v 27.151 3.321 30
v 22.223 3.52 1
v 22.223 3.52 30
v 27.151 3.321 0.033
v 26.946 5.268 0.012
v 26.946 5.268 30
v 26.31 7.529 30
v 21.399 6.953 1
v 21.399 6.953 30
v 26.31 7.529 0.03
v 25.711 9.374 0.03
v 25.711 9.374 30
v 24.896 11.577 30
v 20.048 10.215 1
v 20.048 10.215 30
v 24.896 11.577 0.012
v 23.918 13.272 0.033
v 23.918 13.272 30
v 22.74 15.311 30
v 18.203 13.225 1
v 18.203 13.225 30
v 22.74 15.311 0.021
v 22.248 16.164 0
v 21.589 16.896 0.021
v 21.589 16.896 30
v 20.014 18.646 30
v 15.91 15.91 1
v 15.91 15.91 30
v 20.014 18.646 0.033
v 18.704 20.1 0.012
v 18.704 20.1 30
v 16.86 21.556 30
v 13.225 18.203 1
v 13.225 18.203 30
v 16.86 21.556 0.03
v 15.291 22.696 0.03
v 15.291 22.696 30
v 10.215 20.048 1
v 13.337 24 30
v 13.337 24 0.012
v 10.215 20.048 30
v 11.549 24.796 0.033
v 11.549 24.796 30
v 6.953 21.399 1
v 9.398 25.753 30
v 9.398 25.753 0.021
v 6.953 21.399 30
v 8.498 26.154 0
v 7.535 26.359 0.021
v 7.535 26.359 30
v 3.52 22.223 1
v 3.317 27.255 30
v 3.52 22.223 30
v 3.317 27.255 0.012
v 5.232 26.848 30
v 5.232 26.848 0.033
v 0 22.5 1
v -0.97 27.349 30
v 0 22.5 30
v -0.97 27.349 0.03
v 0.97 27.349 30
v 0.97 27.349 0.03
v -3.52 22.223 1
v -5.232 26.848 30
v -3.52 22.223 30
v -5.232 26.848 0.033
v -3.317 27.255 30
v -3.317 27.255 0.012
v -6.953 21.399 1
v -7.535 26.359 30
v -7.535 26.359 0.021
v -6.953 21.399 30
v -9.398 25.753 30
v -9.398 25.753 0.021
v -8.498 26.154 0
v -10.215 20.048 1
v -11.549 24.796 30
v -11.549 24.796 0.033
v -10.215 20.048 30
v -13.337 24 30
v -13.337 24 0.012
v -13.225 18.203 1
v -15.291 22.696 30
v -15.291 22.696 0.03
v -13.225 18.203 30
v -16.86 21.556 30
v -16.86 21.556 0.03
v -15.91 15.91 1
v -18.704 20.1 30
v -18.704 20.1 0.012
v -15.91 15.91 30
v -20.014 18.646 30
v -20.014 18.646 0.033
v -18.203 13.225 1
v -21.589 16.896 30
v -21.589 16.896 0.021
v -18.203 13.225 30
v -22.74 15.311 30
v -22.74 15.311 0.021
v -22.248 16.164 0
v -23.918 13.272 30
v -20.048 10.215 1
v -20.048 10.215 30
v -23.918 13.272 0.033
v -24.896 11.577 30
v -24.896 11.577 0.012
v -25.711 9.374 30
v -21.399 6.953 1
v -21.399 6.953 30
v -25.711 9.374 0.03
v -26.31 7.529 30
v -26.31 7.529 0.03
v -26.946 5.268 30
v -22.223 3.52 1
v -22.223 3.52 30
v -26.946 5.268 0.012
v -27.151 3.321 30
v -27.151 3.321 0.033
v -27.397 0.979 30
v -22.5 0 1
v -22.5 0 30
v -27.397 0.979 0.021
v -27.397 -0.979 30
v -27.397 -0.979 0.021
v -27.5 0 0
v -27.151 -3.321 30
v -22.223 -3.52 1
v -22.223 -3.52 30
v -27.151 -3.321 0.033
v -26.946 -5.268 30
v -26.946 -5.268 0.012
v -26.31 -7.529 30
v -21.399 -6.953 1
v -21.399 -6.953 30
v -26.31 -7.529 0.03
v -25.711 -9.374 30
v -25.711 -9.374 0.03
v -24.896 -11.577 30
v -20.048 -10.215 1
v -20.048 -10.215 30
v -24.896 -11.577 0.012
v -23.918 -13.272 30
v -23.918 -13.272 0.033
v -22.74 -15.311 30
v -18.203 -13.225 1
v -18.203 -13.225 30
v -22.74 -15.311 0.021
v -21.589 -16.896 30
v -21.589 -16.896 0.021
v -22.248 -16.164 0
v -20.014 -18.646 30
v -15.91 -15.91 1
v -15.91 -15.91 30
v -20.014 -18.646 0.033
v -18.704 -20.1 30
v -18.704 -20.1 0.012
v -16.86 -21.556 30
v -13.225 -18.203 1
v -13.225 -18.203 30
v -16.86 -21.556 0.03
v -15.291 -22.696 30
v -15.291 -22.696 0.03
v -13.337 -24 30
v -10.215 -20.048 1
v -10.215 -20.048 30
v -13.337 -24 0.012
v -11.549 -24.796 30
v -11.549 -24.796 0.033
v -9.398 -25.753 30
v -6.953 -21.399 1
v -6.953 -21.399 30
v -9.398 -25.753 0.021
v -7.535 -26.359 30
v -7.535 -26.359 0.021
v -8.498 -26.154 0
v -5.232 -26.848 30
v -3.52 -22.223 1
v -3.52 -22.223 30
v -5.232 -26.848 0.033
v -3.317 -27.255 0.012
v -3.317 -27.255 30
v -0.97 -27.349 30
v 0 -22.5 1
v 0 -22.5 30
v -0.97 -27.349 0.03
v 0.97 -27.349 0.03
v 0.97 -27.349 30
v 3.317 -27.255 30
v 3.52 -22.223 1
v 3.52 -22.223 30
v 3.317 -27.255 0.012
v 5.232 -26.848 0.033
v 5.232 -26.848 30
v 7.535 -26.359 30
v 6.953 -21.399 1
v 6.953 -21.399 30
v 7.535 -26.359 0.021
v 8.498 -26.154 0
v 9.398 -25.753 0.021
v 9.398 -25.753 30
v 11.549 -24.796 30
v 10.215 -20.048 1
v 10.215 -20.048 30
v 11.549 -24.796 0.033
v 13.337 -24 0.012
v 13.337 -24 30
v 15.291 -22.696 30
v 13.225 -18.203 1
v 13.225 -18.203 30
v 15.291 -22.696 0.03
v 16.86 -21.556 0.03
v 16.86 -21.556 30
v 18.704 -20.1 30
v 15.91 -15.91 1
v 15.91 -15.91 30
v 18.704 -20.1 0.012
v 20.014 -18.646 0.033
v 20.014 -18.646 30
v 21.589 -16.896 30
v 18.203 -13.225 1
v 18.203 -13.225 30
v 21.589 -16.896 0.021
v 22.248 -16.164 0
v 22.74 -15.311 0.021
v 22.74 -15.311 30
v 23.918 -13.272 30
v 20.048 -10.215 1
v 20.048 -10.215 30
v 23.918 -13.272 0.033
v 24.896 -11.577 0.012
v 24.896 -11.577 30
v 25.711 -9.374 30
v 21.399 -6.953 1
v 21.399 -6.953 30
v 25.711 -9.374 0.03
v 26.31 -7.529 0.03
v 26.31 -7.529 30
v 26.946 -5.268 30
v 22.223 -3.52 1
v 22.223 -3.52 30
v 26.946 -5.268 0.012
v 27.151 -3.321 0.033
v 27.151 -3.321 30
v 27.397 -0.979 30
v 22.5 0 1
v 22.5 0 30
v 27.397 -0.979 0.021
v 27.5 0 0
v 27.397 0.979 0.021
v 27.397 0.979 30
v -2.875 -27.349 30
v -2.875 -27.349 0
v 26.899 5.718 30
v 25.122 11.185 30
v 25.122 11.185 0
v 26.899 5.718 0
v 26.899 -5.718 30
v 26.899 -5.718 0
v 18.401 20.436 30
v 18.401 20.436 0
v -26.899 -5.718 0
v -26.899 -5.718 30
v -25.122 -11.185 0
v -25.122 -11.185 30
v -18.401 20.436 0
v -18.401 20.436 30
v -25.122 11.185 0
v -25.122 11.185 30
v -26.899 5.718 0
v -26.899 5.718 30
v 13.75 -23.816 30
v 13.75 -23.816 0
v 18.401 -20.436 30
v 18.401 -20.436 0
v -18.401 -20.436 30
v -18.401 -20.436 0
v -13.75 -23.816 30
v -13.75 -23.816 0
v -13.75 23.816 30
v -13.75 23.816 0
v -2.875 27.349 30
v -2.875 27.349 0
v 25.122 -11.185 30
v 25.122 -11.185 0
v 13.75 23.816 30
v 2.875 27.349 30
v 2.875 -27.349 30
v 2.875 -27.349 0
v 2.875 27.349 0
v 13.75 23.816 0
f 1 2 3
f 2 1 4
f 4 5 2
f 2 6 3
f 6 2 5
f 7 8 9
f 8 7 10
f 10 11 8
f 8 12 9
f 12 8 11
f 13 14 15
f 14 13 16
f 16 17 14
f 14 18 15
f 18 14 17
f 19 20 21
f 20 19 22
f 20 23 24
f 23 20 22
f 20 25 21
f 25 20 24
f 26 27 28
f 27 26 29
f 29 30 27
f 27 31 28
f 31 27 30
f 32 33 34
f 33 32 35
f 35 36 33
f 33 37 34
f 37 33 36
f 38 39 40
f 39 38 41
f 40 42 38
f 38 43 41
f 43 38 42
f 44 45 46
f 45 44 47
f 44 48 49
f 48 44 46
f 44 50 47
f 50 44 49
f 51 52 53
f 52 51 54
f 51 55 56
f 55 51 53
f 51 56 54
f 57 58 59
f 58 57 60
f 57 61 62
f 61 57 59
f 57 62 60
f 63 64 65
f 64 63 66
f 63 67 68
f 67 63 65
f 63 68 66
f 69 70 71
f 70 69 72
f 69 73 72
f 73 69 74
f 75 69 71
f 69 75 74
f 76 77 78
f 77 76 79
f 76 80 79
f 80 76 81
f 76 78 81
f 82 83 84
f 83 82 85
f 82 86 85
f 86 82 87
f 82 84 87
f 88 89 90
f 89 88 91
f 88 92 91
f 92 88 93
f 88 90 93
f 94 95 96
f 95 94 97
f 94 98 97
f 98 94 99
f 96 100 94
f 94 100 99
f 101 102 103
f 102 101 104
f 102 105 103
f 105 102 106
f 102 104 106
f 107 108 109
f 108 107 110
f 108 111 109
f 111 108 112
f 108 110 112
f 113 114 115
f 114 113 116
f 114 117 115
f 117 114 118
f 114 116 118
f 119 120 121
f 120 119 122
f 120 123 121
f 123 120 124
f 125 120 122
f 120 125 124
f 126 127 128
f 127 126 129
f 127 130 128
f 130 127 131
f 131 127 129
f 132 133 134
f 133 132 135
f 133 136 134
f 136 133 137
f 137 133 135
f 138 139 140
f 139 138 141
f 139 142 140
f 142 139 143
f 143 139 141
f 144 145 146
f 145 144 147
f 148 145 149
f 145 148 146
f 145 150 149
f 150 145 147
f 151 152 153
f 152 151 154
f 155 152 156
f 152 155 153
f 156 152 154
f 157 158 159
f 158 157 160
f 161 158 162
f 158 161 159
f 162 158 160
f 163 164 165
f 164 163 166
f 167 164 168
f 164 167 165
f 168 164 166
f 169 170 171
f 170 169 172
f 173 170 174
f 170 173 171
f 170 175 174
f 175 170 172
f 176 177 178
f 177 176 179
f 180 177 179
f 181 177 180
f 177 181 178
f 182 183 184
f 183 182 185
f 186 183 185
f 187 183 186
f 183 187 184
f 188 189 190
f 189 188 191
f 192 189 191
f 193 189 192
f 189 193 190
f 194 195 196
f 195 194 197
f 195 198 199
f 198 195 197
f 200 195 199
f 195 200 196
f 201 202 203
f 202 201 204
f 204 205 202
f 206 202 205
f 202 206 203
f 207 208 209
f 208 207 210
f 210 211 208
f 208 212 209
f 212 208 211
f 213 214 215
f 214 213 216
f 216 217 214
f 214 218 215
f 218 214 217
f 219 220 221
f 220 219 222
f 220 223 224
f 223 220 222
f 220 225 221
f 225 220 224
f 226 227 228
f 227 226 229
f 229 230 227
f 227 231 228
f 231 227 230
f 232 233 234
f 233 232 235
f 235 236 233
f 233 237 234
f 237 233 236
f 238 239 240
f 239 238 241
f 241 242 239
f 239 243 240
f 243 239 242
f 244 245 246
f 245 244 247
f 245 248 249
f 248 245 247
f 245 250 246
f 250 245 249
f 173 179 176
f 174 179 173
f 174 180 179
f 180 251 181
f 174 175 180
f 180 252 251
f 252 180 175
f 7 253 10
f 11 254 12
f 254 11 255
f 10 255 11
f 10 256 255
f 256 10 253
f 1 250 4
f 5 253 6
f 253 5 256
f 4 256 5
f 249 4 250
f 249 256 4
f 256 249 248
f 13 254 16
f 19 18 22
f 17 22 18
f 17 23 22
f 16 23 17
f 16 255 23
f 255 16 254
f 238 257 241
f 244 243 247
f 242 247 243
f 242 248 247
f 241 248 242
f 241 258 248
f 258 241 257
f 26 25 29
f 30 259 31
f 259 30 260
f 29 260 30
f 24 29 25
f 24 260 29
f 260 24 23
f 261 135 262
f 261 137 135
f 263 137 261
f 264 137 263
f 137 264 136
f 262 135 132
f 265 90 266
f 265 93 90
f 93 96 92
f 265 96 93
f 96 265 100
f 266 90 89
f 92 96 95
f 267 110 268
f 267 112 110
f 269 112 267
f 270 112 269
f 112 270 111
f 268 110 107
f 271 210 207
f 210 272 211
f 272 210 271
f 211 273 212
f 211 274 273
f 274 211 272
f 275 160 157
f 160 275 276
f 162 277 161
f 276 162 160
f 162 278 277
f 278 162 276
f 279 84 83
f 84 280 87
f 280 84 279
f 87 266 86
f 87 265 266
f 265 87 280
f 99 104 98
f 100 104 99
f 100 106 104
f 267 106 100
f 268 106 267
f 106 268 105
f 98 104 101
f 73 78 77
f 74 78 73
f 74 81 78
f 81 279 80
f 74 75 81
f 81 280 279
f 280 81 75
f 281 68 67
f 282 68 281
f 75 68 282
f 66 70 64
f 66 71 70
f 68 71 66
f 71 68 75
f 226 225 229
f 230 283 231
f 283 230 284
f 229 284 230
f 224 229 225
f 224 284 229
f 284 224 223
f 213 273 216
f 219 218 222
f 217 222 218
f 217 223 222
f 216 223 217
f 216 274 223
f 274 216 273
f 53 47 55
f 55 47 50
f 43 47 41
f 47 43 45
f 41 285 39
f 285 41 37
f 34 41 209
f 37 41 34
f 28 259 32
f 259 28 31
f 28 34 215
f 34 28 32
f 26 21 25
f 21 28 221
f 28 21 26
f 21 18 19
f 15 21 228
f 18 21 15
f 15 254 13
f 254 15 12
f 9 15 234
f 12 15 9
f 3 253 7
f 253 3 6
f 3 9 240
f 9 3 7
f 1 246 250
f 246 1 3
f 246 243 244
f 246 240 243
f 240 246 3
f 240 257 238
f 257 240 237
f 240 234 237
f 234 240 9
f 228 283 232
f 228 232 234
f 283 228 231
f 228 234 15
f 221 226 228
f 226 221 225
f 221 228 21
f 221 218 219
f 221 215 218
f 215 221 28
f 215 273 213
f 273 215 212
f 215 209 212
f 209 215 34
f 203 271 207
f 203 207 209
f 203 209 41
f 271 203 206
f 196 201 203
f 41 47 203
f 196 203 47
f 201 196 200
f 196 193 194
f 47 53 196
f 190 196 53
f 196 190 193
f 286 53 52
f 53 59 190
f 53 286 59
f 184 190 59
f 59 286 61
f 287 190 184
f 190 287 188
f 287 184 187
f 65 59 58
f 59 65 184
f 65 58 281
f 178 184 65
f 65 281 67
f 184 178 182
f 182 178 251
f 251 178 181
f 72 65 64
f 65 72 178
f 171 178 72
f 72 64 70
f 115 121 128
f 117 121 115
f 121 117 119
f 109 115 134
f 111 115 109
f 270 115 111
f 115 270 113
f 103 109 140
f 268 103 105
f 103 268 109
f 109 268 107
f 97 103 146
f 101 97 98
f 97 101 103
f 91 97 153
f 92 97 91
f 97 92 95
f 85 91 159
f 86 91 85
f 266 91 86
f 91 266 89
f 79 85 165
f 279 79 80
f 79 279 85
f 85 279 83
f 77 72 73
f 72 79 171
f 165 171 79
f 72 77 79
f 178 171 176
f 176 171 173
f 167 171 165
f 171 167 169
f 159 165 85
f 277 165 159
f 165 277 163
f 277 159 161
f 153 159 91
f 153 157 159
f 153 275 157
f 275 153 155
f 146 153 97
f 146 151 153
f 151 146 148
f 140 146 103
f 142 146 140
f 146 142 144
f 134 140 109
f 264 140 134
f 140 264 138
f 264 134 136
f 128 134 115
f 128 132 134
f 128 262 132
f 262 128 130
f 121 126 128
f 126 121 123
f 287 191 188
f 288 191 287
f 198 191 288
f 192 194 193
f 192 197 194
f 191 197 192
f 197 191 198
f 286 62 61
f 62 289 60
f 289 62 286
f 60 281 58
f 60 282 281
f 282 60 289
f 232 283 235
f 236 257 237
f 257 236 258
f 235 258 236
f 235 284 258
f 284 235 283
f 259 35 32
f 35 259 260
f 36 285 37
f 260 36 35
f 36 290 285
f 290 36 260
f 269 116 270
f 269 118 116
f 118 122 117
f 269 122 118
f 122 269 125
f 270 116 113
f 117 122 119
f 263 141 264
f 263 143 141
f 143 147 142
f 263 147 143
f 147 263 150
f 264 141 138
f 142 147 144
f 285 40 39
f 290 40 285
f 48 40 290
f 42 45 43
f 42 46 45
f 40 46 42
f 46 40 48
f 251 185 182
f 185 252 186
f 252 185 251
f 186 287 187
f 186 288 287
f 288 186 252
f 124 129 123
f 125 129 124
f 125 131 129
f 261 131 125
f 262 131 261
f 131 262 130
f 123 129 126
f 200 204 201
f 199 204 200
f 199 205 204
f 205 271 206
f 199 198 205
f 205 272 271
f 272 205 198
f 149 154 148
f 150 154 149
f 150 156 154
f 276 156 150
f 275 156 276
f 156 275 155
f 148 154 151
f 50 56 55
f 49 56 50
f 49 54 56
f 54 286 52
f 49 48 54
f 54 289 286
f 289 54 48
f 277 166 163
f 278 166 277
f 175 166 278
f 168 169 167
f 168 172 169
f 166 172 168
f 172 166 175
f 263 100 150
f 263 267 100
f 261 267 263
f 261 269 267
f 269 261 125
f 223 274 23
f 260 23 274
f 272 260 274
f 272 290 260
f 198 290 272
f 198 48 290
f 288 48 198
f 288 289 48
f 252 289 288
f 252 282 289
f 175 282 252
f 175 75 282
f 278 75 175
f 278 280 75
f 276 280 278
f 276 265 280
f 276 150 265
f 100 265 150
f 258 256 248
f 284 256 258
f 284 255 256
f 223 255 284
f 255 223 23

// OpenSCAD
// file: tapered_cuboid.scad
//A cuboid with a tapered top
//w - width
//l - length
//h - height
//taper - how much to taper the each edge at the top by

module tapered_cuboid(w, l, h, taper) {
	ho = taper;
	hw = w - taper;
	hl = l - taper;
	polyhedron( points=[
		[ 0,  0, 0],
		[ho, ho, h],
		[hw, ho, h],
		[ w,  0, 0],
		[ 0,  l, 0],
		[ho, hl, h],
		[hw, hl, h],
		[ w,  l, 0] 
	], triangles = [
		//side face
		[0, 1, 2],
		[2, 3, 0],
		//side face
		[3, 2, 6],
		[6, 7, 3],
		//side face
		[7, 6, 5],
		[5, 4, 7],
		//side face
		[4, 5, 1],
		[1, 0, 4],
		//top face
		[1, 5, 2],
		[2, 5, 6],
		//bottom face
		[4, 0, 3],
		[7, 4, 3],
	] );
}
// main file
include <tapered_cuboid.scad>

module initio_bot_wheel() {
    r=55/2;
    angle=360/40;
    difference() {
        cylinder(h=30, r=r);
        for(i=[1: 1: 40]) {
            rotate([0,0, angle * i])
            translate([r, 0, 15]) 
                rotate([0, 270, 0])
                translate([-16, -2, -5])
                tapered_cuboid(36,4, 10, taper=2);
        }
    }
}

module initio_gearbox() {
    
}

initio_bot_wheel();
